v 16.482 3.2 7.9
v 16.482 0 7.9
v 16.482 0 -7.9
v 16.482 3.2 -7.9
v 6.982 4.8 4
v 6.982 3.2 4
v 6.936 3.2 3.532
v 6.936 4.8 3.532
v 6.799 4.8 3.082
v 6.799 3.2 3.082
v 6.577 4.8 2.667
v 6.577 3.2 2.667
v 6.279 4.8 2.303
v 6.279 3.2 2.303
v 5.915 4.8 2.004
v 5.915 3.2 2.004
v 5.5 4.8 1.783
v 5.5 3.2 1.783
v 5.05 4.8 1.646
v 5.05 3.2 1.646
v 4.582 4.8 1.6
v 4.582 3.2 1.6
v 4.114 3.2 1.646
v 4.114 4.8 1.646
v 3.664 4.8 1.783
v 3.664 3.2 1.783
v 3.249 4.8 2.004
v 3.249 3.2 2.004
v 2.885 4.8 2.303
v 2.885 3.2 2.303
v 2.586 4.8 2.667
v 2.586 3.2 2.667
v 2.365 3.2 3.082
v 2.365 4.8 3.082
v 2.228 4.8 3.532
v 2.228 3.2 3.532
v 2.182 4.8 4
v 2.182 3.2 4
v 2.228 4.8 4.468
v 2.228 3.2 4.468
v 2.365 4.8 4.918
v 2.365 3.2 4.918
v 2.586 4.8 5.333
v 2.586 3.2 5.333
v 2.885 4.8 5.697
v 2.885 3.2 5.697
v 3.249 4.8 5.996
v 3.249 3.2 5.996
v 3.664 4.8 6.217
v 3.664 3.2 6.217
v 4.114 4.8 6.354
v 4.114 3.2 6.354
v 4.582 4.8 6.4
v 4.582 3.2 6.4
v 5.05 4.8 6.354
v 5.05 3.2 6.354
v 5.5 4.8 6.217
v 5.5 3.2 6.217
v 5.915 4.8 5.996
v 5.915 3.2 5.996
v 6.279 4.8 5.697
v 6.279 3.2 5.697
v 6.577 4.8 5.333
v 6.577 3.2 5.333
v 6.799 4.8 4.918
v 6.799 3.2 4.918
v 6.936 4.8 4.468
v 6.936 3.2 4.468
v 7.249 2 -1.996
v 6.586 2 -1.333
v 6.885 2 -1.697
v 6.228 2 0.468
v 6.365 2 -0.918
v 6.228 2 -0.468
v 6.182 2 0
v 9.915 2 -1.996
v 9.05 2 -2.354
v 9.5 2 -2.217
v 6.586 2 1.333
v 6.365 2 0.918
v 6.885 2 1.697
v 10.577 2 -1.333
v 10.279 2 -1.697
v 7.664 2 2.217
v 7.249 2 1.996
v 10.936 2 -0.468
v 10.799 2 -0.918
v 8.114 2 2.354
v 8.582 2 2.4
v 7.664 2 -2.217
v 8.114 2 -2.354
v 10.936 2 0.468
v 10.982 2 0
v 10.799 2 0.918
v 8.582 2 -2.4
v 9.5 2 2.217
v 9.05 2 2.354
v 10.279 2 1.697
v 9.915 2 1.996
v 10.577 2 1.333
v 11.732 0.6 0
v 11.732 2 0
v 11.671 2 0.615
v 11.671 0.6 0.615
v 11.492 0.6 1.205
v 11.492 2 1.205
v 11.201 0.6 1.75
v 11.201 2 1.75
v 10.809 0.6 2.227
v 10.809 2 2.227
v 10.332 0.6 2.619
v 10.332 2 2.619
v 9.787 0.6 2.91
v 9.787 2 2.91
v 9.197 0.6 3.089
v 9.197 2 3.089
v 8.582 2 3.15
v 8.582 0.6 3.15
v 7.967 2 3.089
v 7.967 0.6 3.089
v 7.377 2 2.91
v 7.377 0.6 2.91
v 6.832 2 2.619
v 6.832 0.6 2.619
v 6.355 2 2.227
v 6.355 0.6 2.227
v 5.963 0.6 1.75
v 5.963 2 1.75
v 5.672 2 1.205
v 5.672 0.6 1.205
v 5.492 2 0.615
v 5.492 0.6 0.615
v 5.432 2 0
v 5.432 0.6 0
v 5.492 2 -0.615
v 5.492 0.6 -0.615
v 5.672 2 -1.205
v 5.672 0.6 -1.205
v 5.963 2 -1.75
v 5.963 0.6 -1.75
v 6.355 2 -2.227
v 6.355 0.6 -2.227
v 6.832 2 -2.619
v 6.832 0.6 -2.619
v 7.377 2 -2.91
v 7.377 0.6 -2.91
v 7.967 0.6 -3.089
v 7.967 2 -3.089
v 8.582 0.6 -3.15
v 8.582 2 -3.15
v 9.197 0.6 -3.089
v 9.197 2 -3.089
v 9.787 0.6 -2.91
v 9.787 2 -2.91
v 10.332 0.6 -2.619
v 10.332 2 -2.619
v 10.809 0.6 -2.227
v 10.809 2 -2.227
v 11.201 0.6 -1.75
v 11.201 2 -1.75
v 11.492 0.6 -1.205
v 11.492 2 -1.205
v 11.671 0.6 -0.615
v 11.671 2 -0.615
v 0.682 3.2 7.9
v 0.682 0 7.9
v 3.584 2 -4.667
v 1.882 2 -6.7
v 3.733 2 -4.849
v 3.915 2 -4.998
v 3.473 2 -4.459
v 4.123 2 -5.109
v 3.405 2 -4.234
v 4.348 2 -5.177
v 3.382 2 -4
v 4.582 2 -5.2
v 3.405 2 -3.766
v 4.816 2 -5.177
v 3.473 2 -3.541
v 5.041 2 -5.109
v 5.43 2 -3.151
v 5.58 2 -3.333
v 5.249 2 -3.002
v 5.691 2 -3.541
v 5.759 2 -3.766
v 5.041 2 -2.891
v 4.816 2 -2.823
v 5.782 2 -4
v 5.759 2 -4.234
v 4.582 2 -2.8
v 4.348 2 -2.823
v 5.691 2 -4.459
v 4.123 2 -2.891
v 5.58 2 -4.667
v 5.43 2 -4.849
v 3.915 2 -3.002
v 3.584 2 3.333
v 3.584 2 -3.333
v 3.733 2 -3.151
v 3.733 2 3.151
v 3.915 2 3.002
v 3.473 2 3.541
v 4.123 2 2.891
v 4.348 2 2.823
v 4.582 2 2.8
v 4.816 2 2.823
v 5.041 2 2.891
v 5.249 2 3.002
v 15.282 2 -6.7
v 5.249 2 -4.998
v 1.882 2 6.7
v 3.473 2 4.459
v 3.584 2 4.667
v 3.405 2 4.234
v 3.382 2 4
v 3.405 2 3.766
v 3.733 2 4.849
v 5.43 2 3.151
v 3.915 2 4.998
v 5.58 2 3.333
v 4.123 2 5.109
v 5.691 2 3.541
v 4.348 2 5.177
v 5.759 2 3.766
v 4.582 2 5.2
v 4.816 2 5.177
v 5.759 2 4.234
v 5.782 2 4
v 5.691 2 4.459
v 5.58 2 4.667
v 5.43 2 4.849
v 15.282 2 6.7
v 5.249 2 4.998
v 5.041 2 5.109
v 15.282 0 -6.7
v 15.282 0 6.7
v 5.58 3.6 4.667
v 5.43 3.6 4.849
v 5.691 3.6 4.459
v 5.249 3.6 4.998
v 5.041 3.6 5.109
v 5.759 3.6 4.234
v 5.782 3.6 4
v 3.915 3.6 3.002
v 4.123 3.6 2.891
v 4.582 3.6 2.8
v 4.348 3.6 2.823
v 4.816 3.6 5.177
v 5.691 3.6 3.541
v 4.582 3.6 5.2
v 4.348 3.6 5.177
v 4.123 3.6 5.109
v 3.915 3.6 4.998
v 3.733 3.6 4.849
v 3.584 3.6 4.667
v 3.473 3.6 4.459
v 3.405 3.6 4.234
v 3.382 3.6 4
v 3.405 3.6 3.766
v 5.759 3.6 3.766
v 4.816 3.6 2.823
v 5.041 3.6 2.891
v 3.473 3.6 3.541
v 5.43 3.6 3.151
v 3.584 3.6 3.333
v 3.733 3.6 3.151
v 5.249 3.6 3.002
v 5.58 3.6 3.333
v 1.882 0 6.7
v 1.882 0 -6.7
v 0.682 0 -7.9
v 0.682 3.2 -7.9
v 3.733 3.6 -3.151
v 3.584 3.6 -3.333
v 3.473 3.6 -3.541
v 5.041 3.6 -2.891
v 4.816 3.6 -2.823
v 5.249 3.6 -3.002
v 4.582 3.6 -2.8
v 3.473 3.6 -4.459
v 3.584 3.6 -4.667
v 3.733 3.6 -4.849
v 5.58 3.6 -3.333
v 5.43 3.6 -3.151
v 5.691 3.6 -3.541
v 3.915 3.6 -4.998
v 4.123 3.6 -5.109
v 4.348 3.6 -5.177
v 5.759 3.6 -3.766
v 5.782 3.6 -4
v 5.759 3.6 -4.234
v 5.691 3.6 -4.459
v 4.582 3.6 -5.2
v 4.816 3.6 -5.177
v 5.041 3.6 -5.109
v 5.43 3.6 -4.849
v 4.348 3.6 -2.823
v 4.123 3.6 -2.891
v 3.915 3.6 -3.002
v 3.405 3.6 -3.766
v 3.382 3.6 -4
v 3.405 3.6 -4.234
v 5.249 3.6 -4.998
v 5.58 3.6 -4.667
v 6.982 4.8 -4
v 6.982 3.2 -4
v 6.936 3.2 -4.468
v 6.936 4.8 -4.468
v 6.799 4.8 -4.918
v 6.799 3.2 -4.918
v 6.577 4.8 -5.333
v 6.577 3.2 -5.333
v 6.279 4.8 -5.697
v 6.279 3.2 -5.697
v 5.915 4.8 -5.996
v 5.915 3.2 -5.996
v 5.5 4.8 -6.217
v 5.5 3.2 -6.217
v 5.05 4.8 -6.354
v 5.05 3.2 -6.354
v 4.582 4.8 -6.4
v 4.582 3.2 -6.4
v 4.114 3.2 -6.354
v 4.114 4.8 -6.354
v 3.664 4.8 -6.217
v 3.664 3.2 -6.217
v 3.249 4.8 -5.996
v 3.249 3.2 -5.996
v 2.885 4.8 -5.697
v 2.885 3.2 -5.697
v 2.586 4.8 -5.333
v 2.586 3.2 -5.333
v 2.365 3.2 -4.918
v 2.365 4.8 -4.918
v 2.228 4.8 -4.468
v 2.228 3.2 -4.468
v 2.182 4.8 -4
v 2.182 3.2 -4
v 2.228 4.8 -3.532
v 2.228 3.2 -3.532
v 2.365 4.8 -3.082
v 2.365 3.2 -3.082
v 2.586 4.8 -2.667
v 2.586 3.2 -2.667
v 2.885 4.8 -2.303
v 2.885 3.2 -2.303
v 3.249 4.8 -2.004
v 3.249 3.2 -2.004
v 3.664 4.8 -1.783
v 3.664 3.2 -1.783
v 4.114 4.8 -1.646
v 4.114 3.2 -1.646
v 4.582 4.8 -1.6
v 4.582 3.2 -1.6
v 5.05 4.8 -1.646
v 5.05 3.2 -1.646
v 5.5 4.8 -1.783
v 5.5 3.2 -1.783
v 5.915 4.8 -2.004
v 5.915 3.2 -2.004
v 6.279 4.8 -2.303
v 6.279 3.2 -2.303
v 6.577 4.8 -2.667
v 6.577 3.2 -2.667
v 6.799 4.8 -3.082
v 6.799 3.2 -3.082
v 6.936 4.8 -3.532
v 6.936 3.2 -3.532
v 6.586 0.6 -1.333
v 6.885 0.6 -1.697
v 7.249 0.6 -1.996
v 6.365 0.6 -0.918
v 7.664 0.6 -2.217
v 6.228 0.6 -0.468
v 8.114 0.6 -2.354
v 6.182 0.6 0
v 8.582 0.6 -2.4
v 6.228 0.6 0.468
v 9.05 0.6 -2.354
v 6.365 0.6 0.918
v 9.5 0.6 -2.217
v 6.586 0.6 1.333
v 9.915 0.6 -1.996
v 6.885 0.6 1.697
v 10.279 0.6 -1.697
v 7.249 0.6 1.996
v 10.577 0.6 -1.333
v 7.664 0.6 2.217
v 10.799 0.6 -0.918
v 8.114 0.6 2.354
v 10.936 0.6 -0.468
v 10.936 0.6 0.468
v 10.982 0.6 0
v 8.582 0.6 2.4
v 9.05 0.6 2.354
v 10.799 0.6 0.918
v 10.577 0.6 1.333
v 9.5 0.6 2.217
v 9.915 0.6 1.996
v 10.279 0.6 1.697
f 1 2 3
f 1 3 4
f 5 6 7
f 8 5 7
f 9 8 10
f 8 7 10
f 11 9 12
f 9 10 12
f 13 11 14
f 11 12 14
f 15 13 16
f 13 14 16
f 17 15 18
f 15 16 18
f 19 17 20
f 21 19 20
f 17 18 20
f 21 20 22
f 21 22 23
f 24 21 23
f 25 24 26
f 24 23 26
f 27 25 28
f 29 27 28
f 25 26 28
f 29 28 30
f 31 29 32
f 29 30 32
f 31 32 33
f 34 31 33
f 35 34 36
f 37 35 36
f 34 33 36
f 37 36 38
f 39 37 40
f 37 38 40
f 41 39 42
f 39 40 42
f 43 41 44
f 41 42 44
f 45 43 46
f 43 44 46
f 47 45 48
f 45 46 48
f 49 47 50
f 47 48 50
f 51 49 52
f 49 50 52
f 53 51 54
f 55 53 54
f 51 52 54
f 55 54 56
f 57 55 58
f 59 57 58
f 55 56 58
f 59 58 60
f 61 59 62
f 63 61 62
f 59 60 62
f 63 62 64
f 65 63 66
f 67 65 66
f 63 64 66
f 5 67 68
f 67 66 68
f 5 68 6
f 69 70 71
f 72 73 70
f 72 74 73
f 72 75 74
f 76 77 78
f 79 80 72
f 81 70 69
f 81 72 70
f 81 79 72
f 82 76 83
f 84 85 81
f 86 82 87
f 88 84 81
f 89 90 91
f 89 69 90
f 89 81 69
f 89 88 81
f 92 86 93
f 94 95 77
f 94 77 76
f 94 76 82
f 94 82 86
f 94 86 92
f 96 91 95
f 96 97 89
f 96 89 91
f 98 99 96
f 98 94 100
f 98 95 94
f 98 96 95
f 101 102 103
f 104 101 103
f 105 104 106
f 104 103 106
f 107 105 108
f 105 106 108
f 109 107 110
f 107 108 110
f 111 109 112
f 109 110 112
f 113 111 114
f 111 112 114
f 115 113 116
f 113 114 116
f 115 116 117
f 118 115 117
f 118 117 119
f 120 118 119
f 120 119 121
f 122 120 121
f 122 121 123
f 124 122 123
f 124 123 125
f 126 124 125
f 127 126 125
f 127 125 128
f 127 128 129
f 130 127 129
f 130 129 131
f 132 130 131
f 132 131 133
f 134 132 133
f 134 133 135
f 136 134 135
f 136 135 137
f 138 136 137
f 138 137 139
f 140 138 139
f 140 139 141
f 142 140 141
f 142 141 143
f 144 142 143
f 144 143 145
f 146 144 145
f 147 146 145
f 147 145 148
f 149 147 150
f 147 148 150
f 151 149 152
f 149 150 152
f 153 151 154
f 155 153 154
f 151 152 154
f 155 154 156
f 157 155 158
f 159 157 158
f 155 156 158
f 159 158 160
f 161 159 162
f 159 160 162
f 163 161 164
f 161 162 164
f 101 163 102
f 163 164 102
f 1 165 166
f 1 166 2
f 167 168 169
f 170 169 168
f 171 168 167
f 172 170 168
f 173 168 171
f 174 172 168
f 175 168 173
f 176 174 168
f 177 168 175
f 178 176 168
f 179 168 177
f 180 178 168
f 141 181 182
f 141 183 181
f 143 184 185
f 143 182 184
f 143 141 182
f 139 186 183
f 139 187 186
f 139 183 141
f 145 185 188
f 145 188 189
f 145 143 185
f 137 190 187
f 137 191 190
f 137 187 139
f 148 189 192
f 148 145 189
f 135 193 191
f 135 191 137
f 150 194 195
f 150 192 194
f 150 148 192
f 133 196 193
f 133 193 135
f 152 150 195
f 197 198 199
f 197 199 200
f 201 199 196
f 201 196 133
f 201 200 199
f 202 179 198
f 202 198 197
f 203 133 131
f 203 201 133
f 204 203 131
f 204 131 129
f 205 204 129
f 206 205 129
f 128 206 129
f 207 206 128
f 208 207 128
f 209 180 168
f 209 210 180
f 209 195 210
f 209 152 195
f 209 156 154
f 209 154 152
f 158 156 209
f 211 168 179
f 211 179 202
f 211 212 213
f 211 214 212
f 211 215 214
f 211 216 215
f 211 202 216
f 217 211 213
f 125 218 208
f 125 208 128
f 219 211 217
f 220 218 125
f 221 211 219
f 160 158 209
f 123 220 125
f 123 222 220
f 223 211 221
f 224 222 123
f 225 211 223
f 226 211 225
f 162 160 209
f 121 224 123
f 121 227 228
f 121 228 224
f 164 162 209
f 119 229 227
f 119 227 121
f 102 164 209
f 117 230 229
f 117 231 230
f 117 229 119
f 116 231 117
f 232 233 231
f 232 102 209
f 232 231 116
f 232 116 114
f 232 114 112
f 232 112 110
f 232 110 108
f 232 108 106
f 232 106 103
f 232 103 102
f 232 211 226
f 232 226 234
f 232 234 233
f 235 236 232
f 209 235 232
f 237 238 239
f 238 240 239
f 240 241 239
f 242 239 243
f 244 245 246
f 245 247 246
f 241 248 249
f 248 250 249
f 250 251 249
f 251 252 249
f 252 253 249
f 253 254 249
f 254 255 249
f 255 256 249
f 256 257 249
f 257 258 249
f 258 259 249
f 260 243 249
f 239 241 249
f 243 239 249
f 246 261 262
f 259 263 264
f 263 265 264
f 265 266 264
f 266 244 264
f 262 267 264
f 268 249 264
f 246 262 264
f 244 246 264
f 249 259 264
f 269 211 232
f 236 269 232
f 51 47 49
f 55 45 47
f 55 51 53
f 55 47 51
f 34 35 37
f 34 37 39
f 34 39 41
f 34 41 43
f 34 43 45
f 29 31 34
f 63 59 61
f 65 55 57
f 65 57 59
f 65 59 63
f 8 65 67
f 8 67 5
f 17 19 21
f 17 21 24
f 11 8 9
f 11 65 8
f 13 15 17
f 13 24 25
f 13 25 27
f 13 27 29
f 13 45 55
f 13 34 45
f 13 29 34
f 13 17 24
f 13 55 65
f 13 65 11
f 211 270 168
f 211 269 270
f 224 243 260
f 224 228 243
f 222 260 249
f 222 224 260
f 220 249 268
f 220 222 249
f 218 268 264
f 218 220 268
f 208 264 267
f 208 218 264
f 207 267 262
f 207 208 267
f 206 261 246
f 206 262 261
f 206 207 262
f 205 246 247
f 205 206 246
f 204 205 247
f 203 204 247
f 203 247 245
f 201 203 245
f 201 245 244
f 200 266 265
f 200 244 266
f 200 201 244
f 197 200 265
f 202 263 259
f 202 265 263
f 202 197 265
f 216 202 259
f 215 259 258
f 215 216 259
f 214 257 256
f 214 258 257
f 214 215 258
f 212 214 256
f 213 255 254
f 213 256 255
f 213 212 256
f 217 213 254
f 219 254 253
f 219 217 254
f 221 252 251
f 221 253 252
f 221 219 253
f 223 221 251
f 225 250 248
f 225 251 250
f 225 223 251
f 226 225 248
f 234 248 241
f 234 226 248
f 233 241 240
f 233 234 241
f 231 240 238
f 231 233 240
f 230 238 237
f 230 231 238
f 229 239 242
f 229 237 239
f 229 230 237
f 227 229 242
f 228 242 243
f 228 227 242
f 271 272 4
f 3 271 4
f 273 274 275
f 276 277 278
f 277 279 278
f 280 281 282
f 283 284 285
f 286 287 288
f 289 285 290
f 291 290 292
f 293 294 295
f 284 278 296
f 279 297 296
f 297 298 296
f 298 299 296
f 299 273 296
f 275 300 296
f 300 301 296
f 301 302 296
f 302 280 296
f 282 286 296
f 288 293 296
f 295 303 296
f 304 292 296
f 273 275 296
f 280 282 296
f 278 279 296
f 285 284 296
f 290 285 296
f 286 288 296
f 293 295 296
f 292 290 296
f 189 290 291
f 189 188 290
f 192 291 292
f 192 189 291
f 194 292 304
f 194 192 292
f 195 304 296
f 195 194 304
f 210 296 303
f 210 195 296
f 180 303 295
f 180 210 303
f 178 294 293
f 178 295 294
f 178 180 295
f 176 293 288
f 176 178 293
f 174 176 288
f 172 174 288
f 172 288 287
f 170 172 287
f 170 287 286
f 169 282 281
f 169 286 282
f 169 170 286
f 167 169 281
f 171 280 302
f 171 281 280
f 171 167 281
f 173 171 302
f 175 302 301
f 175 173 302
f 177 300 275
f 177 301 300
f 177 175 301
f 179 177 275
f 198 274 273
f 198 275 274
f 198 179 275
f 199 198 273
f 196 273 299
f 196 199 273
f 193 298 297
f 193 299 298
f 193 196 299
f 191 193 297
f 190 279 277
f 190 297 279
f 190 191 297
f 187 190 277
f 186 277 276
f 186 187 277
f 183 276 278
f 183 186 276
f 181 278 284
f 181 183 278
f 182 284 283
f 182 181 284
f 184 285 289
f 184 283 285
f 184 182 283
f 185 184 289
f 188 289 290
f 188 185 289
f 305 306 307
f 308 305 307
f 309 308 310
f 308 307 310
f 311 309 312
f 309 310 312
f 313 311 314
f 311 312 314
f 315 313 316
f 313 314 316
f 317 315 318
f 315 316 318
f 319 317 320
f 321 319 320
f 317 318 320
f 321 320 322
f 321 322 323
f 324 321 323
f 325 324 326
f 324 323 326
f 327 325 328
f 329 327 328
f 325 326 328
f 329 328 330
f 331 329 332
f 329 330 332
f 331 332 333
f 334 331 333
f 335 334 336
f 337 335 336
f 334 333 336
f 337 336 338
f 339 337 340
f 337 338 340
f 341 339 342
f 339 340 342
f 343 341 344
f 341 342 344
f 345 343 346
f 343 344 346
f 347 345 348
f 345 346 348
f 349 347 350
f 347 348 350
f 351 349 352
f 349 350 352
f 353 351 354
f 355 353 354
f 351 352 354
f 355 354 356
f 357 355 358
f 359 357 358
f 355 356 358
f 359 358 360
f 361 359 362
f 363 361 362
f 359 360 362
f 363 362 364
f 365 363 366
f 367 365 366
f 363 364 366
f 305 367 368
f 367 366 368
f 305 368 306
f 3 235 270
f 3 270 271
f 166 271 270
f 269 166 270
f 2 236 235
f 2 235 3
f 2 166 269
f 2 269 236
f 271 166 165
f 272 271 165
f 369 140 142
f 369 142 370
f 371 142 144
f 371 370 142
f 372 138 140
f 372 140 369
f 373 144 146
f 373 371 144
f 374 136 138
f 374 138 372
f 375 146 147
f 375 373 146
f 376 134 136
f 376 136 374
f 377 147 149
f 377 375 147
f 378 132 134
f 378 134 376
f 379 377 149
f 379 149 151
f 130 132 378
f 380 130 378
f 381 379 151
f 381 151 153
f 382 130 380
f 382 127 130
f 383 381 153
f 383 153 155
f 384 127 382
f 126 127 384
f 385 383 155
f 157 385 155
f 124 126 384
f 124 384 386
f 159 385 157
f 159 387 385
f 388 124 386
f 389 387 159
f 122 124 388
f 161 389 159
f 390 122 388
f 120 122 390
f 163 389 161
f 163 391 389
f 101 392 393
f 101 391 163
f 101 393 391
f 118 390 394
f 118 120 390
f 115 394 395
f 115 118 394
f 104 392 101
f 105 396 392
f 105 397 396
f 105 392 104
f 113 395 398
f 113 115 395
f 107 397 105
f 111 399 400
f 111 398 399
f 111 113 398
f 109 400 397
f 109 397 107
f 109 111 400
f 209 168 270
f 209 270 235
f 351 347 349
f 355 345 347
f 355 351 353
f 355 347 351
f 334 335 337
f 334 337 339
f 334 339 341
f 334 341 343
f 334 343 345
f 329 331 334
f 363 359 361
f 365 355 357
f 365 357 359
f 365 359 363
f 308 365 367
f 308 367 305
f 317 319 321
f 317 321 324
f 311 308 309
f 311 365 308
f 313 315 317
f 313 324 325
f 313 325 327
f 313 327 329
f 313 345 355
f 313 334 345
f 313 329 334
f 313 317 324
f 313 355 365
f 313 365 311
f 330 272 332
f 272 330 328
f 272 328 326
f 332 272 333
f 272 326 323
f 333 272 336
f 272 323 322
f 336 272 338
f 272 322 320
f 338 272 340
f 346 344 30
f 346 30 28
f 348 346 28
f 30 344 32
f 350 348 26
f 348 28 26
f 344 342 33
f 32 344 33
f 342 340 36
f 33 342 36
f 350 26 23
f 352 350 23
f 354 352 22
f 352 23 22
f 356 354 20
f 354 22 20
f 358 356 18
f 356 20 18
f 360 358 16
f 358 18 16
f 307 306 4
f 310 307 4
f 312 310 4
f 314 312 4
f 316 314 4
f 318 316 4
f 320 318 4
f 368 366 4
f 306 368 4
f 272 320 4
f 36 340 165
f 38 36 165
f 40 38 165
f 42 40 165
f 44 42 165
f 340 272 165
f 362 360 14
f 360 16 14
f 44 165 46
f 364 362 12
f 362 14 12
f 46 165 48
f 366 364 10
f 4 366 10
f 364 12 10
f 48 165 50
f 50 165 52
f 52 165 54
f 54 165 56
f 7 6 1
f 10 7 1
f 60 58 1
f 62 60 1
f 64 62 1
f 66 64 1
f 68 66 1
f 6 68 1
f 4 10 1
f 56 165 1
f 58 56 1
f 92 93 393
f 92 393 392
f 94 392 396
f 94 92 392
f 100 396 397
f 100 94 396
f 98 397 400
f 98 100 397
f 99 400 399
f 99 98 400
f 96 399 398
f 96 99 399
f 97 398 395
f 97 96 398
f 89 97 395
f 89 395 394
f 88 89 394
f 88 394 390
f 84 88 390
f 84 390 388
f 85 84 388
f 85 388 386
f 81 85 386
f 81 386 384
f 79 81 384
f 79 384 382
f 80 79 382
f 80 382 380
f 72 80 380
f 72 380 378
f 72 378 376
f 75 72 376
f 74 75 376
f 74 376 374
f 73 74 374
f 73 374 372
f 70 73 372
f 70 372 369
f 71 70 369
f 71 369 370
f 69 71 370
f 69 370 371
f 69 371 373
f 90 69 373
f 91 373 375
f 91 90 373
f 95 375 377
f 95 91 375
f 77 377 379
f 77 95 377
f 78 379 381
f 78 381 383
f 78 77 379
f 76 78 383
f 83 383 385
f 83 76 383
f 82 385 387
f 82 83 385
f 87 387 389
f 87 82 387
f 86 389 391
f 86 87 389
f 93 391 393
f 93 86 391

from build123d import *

# Parameters (mm, degrees)
MAINBASESKETCH_W          = 15.8
MAINBASESKETCH_H          = 3.2
MAINBASEEXTRUDE_DEPTH     = 7.9
STUDSSKETCH_R             = 2.4
STUDSEXTRUDE_DEPTH        = 1.6
STUDSPATTERN_COUNT        = 2
STUDSPATTERN_PITCH        = 8
MAINBASESHELL_T           = -1.2
UNDERSIDECIRCLEEXT_START  = -0.2
UNDERSIDECIRCLESKETCH_R   = 3.15
UNDERSIDECIRCLESKETCH_R_2 = 2.4
UNDERSIDECIRCLEEXT_DEPTH  = 1.6


with BuildPart() as part:
    # MainBaseSketch → MainBaseExtrude (new, symmetric)
    with BuildSketch(Plane.XY):
        with Locations((8.581967213, 1.6)):
            Rectangle(MAINBASESKETCH_W, MAINBASESKETCH_H)
    extrude(amount=MAINBASEEXTRUDE_DEPTH, both=True)

    # StudsSketch → StudsExtrude (add)
    with BuildSketch(Plane(origin=(0, 3.2, 0), x_dir=(1, 0, 0), z_dir=(0, 1, 0))):
        with Locations((4.581967213, 4)):
            Circle(STUDSSKETCH_R)
    studsextrude = extrude(amount=STUDSEXTRUDE_DEPTH)

    # StudsPattern: StudsExtrude ×2
    with Locations(*[(0, 0, i * STUDSPATTERN_PITCH) for i in range(1, STUDSPATTERN_COUNT)]):
        add(studsextrude)

    # MainBaseShell
    mainbaseshell_openings = [part.faces().sort_by_distance(p)[0] for p in [
        (8.581967213, 0, 0),
    ]]
    offset(amount=MAINBASESHELL_T, openings=mainbaseshell_openings, kind=Kind.INTERSECTION)

    # UnderSideCircleSketch → UnderSideCircleExt (add)
    with BuildSketch(Plane.XZ.offset(-2).offset(UNDERSIDECIRCLEEXT_START)):
        with Locations((8.581967213, 0)):
            Circle(UNDERSIDECIRCLESKETCH_R)
        with Locations((8.581967213, 0)):
            Circle(UNDERSIDECIRCLESKETCH_R_2, mode=Mode.SUBTRACT)
    extrude(amount=UNDERSIDECIRCLEEXT_DEPTH)


solid = part.part
